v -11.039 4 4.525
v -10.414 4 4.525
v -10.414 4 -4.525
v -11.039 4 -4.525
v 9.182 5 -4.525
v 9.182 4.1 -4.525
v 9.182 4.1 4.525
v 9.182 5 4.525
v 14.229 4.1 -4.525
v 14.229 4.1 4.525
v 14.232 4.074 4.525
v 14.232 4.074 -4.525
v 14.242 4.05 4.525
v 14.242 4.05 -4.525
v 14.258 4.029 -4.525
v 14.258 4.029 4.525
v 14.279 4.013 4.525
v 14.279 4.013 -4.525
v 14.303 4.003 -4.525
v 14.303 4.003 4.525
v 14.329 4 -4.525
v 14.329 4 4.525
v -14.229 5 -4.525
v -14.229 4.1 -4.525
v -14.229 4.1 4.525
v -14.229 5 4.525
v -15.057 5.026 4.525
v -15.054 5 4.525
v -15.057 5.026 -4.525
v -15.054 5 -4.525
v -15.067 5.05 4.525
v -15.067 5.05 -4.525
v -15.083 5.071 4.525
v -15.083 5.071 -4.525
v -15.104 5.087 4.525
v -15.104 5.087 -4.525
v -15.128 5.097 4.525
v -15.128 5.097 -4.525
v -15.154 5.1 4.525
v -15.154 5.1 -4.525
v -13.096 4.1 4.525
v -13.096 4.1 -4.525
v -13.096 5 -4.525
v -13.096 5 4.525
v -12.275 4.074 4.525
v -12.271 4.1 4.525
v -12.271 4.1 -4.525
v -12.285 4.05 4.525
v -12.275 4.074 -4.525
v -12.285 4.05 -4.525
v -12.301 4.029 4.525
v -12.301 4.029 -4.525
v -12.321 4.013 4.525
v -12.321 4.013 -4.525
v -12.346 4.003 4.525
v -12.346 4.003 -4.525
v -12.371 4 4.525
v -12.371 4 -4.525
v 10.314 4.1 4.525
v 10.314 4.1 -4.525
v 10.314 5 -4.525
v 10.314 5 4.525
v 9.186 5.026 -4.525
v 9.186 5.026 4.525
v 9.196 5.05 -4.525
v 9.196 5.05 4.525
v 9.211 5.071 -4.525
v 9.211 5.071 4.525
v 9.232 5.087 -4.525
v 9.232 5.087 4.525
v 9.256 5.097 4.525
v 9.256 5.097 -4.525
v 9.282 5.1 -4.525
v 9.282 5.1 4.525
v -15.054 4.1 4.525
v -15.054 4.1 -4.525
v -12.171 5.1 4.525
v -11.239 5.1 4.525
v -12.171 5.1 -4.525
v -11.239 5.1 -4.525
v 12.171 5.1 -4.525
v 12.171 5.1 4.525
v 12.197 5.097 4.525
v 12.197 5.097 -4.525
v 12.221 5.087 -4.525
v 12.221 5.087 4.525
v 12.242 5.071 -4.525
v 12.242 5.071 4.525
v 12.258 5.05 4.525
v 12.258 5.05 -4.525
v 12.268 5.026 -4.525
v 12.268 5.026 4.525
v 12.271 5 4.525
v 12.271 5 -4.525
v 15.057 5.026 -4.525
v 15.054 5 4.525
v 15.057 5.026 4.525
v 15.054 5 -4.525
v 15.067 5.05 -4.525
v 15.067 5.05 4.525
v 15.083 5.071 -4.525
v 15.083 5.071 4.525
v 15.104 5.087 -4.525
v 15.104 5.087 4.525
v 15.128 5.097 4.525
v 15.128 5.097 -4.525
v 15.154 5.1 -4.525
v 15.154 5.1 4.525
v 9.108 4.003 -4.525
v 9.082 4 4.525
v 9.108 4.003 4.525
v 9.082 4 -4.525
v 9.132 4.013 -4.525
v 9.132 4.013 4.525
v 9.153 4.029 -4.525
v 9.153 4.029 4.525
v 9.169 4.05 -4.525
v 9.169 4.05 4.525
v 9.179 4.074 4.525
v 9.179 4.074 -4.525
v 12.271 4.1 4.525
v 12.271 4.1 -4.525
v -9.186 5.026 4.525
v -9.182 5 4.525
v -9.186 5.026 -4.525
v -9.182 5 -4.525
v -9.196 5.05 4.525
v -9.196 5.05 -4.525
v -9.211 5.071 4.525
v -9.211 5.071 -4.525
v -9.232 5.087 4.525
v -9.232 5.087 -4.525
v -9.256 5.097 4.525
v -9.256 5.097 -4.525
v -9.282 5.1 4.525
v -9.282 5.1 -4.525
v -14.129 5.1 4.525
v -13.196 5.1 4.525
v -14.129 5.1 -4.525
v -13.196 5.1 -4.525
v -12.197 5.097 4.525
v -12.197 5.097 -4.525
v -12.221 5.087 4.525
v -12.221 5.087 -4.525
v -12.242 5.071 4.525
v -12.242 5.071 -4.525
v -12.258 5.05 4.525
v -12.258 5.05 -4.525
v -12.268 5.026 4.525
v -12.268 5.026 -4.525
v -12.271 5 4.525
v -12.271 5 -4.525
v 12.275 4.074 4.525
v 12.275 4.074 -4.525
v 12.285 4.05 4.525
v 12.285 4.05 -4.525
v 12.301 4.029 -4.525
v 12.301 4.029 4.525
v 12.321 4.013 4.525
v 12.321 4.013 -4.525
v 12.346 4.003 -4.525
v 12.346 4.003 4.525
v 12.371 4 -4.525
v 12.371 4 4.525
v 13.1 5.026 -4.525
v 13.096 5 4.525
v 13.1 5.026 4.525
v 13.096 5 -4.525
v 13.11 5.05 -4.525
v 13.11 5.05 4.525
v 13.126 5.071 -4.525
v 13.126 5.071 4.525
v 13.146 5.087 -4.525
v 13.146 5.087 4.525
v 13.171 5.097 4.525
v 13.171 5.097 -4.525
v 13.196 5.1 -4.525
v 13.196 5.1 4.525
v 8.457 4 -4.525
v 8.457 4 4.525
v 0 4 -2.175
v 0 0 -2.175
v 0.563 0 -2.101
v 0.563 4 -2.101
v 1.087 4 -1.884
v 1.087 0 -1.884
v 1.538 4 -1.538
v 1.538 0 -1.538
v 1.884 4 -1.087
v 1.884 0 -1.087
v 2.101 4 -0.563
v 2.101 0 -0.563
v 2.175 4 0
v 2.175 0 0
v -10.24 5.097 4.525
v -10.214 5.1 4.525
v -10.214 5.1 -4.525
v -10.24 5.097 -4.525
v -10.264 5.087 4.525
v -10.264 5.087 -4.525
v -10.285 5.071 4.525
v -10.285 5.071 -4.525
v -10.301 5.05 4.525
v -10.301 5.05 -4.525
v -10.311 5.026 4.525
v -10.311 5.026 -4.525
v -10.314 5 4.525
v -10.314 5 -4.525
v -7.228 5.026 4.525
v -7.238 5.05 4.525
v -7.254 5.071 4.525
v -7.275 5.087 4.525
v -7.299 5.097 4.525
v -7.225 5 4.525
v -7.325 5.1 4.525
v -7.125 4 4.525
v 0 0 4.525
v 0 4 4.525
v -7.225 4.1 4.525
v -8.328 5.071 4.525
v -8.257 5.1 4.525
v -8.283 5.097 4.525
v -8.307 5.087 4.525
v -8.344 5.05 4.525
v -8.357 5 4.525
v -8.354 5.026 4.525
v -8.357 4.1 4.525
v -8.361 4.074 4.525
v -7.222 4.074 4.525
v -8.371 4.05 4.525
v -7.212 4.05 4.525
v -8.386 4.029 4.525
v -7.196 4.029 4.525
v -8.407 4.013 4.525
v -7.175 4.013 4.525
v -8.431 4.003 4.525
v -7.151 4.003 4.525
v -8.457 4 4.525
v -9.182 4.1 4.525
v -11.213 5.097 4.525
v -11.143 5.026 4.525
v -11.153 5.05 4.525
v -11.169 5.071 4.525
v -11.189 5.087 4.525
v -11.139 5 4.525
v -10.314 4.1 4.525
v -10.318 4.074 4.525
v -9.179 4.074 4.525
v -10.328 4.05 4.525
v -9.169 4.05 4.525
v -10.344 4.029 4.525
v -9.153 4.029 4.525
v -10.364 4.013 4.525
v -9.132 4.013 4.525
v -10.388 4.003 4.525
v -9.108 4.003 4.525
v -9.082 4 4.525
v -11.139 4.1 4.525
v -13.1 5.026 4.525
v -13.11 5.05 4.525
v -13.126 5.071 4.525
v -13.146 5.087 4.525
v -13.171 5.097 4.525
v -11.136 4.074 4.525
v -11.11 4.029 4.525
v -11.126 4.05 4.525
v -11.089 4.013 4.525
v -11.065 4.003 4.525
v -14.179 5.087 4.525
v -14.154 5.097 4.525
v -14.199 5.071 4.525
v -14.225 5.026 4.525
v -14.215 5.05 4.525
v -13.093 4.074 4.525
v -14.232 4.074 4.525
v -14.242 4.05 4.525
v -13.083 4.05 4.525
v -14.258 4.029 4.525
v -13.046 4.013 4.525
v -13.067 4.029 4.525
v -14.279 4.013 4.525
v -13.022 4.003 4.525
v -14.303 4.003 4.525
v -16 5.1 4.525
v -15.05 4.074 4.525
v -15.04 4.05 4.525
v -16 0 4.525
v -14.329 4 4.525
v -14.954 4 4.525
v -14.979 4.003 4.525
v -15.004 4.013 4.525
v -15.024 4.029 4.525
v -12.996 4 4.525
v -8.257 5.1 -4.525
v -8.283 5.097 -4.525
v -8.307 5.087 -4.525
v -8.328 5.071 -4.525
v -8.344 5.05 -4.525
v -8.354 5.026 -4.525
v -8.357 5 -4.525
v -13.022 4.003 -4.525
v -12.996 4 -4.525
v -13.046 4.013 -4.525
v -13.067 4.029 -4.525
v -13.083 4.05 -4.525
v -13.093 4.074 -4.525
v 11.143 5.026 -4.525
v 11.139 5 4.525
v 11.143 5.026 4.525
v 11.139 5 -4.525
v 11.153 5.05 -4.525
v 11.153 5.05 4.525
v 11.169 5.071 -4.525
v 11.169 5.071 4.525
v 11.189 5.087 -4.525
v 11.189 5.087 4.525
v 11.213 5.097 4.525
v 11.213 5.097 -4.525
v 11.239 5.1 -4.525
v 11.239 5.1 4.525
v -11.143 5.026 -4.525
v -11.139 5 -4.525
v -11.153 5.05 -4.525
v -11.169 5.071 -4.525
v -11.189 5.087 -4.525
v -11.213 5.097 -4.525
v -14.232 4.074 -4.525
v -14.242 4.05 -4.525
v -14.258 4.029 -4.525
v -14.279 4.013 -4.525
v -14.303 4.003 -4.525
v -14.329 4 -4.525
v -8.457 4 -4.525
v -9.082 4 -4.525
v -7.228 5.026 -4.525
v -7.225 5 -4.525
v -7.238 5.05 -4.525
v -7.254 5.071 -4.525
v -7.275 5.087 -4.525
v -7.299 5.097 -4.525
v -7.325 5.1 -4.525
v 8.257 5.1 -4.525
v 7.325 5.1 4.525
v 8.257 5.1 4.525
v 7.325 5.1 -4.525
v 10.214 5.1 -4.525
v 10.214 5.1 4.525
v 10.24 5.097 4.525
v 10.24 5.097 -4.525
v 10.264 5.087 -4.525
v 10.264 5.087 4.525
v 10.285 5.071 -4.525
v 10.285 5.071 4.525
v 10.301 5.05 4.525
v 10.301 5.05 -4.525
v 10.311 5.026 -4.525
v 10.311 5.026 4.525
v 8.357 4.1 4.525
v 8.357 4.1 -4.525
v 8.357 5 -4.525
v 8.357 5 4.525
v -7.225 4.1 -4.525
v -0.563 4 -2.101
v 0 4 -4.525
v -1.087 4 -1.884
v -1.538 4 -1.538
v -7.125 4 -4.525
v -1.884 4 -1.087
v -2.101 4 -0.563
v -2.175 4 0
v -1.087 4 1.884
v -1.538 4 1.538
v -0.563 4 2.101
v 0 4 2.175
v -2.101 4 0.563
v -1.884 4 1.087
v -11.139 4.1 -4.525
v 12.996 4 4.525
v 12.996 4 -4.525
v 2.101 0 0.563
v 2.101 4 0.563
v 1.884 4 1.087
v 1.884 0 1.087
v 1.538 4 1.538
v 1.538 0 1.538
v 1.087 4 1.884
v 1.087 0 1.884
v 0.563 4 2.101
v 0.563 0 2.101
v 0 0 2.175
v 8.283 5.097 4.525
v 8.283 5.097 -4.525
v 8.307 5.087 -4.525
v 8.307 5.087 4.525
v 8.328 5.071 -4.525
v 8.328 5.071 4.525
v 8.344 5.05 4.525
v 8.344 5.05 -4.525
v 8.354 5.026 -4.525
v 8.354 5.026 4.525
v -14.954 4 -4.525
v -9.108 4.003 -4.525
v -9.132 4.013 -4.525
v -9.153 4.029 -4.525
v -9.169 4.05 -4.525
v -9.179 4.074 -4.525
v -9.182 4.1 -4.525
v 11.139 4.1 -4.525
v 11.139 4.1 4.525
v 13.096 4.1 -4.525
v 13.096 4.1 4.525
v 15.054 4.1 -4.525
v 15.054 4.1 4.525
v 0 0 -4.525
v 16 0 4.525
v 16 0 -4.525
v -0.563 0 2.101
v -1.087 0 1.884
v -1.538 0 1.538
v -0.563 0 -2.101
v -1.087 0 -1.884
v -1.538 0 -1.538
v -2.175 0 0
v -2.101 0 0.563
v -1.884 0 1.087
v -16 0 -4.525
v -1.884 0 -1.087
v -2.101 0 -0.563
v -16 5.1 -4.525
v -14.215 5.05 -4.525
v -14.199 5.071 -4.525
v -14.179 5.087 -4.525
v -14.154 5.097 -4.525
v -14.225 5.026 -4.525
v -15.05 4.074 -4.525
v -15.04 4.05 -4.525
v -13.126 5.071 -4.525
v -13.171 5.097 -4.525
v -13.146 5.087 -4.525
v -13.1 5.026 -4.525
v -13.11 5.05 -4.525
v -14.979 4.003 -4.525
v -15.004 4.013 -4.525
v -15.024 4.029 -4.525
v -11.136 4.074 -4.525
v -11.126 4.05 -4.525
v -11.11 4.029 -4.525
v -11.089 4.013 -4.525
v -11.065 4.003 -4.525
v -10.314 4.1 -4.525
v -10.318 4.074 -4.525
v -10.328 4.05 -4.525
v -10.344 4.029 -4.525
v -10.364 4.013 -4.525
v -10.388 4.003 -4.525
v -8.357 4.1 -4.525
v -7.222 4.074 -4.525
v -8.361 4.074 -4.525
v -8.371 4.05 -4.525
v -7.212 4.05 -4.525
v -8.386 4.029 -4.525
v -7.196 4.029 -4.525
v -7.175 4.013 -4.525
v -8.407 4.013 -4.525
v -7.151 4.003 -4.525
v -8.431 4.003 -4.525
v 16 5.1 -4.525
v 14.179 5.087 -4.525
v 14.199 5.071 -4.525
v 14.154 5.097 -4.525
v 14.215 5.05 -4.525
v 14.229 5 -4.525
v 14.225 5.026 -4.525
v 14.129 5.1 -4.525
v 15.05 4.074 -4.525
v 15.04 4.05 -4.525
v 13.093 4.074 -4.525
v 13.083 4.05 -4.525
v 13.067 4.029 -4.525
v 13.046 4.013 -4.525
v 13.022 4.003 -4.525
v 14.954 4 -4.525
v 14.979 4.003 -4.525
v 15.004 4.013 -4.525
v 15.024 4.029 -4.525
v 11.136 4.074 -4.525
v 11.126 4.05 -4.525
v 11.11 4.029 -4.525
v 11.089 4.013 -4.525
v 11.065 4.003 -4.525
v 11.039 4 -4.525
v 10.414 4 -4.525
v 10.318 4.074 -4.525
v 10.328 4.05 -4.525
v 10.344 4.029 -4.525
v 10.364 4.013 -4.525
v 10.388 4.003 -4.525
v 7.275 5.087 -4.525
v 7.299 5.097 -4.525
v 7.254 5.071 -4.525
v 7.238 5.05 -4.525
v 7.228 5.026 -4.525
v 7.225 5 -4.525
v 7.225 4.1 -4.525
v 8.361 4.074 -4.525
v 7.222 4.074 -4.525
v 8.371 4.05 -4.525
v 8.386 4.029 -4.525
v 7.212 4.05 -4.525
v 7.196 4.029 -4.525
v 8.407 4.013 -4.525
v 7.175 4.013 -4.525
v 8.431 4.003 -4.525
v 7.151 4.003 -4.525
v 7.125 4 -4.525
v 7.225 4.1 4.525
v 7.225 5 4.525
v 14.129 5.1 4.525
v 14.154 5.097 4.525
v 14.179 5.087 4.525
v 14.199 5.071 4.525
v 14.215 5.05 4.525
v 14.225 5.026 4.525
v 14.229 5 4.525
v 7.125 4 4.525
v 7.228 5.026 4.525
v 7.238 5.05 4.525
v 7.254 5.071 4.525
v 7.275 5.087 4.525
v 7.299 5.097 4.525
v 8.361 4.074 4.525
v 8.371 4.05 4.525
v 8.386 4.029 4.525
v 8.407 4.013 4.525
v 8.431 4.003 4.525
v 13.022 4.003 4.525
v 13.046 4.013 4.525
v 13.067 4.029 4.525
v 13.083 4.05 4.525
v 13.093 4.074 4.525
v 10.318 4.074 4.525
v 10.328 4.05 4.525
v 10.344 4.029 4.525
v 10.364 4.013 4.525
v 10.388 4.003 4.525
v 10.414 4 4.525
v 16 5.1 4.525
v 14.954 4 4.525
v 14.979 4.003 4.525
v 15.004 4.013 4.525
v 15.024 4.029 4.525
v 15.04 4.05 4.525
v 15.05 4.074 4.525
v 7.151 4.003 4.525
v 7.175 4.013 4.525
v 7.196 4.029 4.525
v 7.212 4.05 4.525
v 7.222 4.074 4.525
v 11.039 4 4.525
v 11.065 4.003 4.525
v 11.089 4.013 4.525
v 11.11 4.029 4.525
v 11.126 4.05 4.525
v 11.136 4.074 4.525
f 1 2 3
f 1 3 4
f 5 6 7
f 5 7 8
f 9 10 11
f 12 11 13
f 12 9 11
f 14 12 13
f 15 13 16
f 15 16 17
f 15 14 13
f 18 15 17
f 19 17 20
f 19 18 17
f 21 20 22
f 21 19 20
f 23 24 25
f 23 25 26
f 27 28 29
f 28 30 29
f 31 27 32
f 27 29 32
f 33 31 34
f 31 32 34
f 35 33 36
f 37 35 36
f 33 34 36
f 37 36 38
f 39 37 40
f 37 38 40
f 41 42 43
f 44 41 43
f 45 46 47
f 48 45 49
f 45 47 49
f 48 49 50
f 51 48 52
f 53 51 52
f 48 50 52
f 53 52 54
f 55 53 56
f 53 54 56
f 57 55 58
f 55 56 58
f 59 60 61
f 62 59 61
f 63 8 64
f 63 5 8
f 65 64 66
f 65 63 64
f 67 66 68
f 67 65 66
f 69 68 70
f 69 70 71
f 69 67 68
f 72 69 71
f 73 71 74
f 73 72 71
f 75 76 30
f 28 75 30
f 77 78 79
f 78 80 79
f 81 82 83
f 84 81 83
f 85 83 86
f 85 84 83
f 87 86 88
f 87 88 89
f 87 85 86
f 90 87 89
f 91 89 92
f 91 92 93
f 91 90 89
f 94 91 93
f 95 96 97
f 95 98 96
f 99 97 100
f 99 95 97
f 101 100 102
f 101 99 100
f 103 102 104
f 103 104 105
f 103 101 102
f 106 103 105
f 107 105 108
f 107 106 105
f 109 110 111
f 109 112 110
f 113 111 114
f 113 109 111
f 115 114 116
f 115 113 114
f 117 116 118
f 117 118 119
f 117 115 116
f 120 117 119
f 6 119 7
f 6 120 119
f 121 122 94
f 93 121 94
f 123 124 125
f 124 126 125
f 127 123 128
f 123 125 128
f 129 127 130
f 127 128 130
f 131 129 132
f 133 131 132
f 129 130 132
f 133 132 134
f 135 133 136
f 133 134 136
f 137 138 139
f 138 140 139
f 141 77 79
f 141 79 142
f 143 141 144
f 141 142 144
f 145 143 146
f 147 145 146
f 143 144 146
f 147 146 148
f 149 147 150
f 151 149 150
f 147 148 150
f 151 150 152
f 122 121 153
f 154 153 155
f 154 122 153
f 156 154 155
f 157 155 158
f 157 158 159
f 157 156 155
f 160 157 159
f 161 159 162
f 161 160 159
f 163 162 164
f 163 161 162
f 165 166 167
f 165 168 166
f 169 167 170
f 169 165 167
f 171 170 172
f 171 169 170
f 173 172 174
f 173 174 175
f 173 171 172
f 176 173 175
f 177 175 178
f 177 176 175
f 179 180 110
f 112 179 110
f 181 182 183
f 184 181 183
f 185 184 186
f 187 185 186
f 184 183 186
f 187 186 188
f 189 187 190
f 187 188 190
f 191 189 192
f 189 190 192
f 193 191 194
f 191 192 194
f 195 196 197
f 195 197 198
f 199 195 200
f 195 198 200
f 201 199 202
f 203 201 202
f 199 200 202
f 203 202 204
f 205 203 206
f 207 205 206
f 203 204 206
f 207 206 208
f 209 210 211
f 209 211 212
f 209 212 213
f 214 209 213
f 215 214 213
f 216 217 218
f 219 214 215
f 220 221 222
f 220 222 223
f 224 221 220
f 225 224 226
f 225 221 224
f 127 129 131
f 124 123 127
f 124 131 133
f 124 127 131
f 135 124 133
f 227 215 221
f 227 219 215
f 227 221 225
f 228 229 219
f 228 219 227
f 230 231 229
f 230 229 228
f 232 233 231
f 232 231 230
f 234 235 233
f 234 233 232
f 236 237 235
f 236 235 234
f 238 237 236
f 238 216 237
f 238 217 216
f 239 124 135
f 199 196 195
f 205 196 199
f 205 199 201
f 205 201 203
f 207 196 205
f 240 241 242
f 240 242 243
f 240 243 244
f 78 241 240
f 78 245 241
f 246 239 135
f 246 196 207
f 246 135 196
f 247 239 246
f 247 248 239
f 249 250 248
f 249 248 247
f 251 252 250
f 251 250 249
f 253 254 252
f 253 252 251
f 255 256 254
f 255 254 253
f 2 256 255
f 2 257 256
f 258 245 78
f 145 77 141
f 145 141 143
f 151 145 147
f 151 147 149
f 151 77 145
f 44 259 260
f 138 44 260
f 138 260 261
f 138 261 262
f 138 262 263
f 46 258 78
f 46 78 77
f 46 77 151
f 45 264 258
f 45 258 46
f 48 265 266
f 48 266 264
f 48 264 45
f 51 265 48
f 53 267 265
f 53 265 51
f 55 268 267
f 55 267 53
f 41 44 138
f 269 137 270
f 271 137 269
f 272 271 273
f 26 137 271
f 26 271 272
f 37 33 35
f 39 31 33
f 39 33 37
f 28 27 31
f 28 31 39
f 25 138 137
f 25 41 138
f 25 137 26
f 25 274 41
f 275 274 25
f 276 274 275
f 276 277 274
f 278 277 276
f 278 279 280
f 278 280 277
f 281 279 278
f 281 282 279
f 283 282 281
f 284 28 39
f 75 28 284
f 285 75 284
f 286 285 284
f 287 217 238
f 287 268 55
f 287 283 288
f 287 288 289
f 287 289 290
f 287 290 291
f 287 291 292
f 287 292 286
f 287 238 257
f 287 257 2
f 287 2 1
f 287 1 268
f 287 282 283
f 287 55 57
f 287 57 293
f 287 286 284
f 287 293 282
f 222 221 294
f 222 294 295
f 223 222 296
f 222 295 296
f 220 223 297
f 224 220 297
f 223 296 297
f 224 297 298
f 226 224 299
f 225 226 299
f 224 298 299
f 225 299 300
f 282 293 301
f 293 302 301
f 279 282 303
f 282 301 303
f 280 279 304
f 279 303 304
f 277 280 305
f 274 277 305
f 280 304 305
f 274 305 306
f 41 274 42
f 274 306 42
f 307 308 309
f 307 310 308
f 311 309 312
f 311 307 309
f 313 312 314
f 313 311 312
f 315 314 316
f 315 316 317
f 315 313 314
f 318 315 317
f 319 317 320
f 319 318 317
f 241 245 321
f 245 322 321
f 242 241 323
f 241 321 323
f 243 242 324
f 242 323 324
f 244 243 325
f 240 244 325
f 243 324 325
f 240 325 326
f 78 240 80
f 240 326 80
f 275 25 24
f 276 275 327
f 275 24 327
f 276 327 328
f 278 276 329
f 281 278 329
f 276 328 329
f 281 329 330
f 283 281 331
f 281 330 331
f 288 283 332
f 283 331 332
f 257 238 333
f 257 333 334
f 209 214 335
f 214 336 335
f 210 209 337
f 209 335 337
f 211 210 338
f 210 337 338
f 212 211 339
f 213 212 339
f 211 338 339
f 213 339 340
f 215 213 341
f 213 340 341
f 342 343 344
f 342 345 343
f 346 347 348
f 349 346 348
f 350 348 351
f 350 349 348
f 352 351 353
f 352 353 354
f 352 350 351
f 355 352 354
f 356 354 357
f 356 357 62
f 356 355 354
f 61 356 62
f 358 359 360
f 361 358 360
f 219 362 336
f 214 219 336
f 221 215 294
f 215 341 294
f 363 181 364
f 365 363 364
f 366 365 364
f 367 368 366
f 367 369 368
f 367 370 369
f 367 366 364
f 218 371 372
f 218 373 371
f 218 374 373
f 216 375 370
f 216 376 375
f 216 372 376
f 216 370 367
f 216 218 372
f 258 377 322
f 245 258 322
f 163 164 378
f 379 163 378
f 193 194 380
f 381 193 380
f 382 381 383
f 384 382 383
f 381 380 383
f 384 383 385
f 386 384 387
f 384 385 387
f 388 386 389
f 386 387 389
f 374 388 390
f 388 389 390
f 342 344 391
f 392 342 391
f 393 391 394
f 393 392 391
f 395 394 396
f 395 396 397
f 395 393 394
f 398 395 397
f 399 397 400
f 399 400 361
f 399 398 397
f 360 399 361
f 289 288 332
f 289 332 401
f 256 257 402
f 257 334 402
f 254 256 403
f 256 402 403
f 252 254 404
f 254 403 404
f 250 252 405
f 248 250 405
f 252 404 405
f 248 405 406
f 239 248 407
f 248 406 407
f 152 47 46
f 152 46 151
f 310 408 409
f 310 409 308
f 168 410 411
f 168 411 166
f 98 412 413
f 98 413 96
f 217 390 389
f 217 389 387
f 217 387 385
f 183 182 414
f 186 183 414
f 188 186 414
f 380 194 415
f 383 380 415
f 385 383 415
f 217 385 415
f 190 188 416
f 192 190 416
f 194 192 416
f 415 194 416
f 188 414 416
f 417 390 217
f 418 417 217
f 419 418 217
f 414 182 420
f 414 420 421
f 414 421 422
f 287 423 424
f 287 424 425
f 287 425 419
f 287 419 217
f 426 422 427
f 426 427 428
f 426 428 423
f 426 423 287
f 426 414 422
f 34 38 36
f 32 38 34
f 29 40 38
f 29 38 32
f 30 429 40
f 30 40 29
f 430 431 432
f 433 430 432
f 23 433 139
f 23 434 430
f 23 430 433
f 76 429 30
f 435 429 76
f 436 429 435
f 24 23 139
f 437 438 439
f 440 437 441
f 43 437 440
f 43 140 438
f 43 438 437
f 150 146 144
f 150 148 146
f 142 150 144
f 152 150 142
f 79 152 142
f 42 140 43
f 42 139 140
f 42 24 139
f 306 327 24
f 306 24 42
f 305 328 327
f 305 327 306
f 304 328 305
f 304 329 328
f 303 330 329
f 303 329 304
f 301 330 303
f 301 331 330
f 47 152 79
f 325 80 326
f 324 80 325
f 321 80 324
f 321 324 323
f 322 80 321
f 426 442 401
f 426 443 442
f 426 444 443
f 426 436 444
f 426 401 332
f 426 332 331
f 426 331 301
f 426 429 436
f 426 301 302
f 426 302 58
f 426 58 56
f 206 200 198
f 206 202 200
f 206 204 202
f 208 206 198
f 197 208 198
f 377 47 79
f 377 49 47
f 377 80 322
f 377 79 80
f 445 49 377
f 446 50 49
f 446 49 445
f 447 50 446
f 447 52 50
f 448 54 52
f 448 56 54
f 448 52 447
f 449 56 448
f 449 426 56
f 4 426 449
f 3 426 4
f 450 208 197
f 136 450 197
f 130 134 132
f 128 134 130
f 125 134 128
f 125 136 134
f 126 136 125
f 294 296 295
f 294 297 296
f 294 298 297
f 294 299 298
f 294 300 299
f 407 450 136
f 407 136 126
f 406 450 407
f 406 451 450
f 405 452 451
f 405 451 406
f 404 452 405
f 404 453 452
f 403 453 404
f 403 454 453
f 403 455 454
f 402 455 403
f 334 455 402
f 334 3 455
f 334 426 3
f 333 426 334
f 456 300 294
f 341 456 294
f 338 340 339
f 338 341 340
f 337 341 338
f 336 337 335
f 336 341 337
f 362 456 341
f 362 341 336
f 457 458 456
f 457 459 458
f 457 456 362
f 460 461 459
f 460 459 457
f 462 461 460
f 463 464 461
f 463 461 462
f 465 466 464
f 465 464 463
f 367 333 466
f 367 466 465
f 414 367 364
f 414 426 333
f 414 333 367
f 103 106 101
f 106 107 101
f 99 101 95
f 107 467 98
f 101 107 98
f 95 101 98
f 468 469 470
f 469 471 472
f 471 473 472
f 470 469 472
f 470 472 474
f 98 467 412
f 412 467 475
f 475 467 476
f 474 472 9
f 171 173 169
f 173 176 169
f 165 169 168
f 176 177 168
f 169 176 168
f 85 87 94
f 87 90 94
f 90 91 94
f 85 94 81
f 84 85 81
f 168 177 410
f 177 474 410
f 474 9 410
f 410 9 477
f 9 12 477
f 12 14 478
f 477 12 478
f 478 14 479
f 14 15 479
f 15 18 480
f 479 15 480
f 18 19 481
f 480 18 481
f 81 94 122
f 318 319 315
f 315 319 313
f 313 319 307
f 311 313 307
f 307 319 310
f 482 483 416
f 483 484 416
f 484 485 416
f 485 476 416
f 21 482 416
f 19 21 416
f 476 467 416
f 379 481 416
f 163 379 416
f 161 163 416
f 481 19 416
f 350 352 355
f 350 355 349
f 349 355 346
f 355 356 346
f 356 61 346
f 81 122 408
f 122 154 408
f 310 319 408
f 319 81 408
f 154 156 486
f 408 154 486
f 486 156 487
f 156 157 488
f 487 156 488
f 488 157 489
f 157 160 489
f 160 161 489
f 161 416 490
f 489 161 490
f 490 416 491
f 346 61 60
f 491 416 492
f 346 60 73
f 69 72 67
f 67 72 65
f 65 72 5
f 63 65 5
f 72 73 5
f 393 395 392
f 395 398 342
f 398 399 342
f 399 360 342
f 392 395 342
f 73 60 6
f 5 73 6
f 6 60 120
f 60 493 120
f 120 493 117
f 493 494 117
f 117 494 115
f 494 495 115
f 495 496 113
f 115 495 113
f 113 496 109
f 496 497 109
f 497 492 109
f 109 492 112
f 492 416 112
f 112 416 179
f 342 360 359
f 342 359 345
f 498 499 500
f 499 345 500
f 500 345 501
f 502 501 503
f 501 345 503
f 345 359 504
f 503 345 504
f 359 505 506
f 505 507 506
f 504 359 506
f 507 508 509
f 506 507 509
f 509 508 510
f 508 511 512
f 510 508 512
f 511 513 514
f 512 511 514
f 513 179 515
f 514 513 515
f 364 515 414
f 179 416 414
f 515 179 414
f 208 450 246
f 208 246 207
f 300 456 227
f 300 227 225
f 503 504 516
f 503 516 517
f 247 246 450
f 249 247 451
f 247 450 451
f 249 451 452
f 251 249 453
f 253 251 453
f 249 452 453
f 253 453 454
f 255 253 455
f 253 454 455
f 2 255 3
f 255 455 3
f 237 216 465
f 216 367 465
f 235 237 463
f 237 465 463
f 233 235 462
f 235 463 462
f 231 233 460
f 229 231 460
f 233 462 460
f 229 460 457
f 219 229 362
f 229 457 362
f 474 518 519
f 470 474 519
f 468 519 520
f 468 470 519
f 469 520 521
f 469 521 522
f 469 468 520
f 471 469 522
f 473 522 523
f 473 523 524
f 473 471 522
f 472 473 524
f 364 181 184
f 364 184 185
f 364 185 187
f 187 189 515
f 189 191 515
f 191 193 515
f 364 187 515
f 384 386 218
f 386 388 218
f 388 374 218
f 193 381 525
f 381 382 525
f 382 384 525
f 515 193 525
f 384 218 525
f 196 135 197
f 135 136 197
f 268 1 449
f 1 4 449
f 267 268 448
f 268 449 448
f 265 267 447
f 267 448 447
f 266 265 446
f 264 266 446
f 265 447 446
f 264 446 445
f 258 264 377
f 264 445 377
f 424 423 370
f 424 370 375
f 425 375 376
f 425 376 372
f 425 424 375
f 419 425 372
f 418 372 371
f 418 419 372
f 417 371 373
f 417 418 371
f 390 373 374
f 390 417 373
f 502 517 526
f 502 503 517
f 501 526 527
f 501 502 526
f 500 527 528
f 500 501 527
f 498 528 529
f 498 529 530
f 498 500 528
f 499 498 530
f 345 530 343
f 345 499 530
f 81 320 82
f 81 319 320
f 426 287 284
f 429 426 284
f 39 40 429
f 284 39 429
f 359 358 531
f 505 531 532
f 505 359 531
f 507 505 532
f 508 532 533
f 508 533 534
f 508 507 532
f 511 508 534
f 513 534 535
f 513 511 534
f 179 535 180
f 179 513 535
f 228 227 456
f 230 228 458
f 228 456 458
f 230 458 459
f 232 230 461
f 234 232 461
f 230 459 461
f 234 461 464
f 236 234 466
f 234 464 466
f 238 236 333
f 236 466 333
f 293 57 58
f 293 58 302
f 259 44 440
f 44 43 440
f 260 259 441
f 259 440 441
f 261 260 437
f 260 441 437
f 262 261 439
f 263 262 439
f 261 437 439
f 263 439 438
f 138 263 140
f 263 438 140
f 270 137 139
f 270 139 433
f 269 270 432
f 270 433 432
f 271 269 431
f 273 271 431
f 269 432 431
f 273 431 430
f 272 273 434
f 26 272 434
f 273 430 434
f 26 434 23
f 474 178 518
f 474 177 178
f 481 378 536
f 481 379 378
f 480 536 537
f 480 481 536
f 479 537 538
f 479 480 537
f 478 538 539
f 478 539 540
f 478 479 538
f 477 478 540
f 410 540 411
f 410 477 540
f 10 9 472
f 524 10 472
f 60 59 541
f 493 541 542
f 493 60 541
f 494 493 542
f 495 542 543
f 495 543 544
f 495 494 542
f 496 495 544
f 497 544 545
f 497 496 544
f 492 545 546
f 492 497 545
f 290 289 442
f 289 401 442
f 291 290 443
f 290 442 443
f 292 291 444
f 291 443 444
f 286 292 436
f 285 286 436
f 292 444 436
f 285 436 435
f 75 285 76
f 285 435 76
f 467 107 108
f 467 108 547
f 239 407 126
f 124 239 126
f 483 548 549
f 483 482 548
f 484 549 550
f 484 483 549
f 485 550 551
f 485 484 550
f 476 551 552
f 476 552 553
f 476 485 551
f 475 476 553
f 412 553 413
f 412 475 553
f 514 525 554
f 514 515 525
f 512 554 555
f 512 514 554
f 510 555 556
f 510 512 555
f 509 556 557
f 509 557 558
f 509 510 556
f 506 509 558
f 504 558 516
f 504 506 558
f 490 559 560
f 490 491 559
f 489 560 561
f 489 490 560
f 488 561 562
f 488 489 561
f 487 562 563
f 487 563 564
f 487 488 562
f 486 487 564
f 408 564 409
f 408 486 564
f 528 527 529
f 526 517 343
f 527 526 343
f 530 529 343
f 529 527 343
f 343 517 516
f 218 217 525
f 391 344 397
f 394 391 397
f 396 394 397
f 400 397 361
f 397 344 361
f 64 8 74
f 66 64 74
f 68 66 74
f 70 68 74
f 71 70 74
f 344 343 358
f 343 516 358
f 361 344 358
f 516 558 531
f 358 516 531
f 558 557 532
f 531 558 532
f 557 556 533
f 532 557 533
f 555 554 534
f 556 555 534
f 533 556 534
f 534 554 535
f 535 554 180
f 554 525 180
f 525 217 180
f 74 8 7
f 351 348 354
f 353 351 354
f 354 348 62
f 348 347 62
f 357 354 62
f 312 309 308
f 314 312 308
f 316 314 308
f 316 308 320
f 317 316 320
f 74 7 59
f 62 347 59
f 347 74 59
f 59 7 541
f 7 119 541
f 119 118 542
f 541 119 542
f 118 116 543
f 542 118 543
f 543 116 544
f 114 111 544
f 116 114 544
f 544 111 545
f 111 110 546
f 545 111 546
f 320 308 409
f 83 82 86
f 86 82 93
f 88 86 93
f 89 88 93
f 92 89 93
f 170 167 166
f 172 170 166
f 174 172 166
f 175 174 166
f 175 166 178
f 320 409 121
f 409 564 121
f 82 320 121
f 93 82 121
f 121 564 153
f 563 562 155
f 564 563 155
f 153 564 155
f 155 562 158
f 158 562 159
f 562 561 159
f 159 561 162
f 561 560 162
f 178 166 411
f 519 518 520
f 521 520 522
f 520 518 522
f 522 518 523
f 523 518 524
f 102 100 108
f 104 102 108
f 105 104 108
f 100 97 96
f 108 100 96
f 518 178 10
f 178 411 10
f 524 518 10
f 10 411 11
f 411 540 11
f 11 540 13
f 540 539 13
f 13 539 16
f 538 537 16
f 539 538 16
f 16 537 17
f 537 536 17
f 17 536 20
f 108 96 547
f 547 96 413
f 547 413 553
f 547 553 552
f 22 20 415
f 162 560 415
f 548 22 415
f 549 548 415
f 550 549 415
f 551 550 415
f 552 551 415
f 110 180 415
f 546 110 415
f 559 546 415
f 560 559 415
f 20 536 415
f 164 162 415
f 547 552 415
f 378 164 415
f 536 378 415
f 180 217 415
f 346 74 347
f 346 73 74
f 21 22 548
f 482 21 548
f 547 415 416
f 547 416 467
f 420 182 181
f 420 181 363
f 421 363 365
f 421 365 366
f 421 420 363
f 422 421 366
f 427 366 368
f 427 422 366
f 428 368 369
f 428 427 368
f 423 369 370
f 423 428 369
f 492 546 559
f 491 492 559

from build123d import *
from build123d.topology import SkipClean

# Parameters (mm, degrees)
BOSS_EXTRUDE1_DEPTH = 5.1
SKETCH2_W           = 14.45
SKETCH2_H           = 1.1
CUT_EXTRUDE1_DEPTH  = 23.625704409
SKETCH3_W           = 0.825
SKETCH3_H           = 1.1
CUT_EXTRUDE2_DEPTH  = 10
FILLET1_R           = 0.1
SKETCH4_W           = 4.1
SKETCH4_H           = 5.1
CUT_EXTRUDE3_DEPTH  = 10


with BuildPart() as part:
    # Sketch1 → Boss-Extrude1 (new body)
    with BuildSketch(Plane(origin=(0, 0, 0), x_dir=(1, 0, 0), z_dir=(0, 1, 0))):
        with BuildLine():
            Line((20.1, 4.525), (0, 4.525))
            Line((0, 4.525), (0, 2.175))
            ThreePointArc((0, 2.175), (1.537957249, 1.537957249), (2.175, 0))
            Line((2.175, 0), (20.1, 0))
            Line((20.1, 0), (20.1, 4.525))
        make_face()
        with BuildLine():
            Line((20.1, 0), (2.175, 0))
            ThreePointArc((2.175, 0), (1.537957249, -1.537957249), (0, -2.175))
            Line((0, -2.175), (0, -4.525))
            Line((0, -4.525), (20.1, -4.525))
            Line((20.1, -4.525), (20.1, 0))
        make_face()
    extrude(amount=BOSS_EXTRUDE1_DEPTH)

    # Sketch2 → Cut-Extrude1 (cut, through all)
    with BuildSketch(Plane.XY.offset(4.525)):
        with Locations((0, 4.55)):
            Rectangle(SKETCH2_W, SKETCH2_H)
    extrude(amount=-CUT_EXTRUDE1_DEPTH, mode=Mode.SUBTRACT)

    # Sketch3 → Cut-Extrude2 (cut)
    with BuildSketch(Plane.XY.offset(4.525)):
        with Locations((8.769642857, 4.55)):
            Rectangle(SKETCH3_W, SKETCH3_H)
        with Locations((10.726785714, 4.55)):
            Rectangle(SKETCH3_W, SKETCH3_H)
        with Locations((12.683928571, 4.55)):
            Rectangle(SKETCH3_W, SKETCH3_H)
        with Locations((14.641071429, 4.55)):
            Rectangle(SKETCH3_W, SKETCH3_H)
        with Locations((16.598214286, 4.55)):
            Rectangle(SKETCH3_W, SKETCH3_H)
        with Locations((18.555357143, 4.55)):
            Rectangle(SKETCH3_W, SKETCH3_H)
    extrude(amount=-CUT_EXTRUDE2_DEPTH, mode=Mode.SUBTRACT)

    # Fillet1
    fillet1_edges = [part.edges().sort_by_distance(p)[0] for p in [
        (14.228571429, 4, 0),
        (15.053571429, 4, 0),
        (17.010714286, 5.1, 0),
        (16.185714286, 5.1, 0),
        (16.185714286, 4, 0),
        (17.010714286, 4, 0),
        (18.967857143, 5.1, 0),
        (18.142857143, 5.1, 0),
        (18.142857143, 4, 0),
        (18.967857143, 4, 0),
        (20.1, 5.1, 0),
        (7.225, 4, 0),
        (7.225, 5.1, 0),
        (9.182142857, 5.1, 0),
        (8.357142857, 5.1, 0),
        (8.357142857, 4, 0),
        (9.182142857, 4, 0),
        (11.139285714, 5.1, 0),
        (10.314285714, 5.1, 0),
        (10.314285714, 4, 0),
        (11.139285714, 4, 0),
        (13.096428571, 5.1, 0),
        (12.271428571, 5.1, 0),
        (12.271428571, 4, 0),
        (13.096428571, 4, 0),
        (15.053571429, 5.1, 0),
        (14.228571429, 5.1, 0),
    ]]
    fillet(fillet1_edges, radius=FILLET1_R)

    # Mirror3: part across plane


with BuildPart() as part_1:
    with SkipClean():  # the faces are left unmerged after this step: merging them gives an invalid solid
        add(part.part)
        add(part.part.mirror(Plane(origin=(0, 5.1, 0), x_dir=(0, 0, 1), z_dir=(1, 0, 0))))

    # Sketch4 → Cut-Extrude3 (cut)
    with SkipClean():  # the faces are left unmerged after this step: merging them gives an invalid solid
        with BuildSketch(Plane.XY.offset(4.525)):
            with Locations((18.05, 2.55)):
                Rectangle(SKETCH4_W, SKETCH4_H)
            with Locations((-18.05, 2.55)):
                Rectangle(SKETCH4_W, SKETCH4_H)
        extrude(amount=-CUT_EXTRUDE3_DEPTH, mode=Mode.SUBTRACT)


solid = part_1.part
